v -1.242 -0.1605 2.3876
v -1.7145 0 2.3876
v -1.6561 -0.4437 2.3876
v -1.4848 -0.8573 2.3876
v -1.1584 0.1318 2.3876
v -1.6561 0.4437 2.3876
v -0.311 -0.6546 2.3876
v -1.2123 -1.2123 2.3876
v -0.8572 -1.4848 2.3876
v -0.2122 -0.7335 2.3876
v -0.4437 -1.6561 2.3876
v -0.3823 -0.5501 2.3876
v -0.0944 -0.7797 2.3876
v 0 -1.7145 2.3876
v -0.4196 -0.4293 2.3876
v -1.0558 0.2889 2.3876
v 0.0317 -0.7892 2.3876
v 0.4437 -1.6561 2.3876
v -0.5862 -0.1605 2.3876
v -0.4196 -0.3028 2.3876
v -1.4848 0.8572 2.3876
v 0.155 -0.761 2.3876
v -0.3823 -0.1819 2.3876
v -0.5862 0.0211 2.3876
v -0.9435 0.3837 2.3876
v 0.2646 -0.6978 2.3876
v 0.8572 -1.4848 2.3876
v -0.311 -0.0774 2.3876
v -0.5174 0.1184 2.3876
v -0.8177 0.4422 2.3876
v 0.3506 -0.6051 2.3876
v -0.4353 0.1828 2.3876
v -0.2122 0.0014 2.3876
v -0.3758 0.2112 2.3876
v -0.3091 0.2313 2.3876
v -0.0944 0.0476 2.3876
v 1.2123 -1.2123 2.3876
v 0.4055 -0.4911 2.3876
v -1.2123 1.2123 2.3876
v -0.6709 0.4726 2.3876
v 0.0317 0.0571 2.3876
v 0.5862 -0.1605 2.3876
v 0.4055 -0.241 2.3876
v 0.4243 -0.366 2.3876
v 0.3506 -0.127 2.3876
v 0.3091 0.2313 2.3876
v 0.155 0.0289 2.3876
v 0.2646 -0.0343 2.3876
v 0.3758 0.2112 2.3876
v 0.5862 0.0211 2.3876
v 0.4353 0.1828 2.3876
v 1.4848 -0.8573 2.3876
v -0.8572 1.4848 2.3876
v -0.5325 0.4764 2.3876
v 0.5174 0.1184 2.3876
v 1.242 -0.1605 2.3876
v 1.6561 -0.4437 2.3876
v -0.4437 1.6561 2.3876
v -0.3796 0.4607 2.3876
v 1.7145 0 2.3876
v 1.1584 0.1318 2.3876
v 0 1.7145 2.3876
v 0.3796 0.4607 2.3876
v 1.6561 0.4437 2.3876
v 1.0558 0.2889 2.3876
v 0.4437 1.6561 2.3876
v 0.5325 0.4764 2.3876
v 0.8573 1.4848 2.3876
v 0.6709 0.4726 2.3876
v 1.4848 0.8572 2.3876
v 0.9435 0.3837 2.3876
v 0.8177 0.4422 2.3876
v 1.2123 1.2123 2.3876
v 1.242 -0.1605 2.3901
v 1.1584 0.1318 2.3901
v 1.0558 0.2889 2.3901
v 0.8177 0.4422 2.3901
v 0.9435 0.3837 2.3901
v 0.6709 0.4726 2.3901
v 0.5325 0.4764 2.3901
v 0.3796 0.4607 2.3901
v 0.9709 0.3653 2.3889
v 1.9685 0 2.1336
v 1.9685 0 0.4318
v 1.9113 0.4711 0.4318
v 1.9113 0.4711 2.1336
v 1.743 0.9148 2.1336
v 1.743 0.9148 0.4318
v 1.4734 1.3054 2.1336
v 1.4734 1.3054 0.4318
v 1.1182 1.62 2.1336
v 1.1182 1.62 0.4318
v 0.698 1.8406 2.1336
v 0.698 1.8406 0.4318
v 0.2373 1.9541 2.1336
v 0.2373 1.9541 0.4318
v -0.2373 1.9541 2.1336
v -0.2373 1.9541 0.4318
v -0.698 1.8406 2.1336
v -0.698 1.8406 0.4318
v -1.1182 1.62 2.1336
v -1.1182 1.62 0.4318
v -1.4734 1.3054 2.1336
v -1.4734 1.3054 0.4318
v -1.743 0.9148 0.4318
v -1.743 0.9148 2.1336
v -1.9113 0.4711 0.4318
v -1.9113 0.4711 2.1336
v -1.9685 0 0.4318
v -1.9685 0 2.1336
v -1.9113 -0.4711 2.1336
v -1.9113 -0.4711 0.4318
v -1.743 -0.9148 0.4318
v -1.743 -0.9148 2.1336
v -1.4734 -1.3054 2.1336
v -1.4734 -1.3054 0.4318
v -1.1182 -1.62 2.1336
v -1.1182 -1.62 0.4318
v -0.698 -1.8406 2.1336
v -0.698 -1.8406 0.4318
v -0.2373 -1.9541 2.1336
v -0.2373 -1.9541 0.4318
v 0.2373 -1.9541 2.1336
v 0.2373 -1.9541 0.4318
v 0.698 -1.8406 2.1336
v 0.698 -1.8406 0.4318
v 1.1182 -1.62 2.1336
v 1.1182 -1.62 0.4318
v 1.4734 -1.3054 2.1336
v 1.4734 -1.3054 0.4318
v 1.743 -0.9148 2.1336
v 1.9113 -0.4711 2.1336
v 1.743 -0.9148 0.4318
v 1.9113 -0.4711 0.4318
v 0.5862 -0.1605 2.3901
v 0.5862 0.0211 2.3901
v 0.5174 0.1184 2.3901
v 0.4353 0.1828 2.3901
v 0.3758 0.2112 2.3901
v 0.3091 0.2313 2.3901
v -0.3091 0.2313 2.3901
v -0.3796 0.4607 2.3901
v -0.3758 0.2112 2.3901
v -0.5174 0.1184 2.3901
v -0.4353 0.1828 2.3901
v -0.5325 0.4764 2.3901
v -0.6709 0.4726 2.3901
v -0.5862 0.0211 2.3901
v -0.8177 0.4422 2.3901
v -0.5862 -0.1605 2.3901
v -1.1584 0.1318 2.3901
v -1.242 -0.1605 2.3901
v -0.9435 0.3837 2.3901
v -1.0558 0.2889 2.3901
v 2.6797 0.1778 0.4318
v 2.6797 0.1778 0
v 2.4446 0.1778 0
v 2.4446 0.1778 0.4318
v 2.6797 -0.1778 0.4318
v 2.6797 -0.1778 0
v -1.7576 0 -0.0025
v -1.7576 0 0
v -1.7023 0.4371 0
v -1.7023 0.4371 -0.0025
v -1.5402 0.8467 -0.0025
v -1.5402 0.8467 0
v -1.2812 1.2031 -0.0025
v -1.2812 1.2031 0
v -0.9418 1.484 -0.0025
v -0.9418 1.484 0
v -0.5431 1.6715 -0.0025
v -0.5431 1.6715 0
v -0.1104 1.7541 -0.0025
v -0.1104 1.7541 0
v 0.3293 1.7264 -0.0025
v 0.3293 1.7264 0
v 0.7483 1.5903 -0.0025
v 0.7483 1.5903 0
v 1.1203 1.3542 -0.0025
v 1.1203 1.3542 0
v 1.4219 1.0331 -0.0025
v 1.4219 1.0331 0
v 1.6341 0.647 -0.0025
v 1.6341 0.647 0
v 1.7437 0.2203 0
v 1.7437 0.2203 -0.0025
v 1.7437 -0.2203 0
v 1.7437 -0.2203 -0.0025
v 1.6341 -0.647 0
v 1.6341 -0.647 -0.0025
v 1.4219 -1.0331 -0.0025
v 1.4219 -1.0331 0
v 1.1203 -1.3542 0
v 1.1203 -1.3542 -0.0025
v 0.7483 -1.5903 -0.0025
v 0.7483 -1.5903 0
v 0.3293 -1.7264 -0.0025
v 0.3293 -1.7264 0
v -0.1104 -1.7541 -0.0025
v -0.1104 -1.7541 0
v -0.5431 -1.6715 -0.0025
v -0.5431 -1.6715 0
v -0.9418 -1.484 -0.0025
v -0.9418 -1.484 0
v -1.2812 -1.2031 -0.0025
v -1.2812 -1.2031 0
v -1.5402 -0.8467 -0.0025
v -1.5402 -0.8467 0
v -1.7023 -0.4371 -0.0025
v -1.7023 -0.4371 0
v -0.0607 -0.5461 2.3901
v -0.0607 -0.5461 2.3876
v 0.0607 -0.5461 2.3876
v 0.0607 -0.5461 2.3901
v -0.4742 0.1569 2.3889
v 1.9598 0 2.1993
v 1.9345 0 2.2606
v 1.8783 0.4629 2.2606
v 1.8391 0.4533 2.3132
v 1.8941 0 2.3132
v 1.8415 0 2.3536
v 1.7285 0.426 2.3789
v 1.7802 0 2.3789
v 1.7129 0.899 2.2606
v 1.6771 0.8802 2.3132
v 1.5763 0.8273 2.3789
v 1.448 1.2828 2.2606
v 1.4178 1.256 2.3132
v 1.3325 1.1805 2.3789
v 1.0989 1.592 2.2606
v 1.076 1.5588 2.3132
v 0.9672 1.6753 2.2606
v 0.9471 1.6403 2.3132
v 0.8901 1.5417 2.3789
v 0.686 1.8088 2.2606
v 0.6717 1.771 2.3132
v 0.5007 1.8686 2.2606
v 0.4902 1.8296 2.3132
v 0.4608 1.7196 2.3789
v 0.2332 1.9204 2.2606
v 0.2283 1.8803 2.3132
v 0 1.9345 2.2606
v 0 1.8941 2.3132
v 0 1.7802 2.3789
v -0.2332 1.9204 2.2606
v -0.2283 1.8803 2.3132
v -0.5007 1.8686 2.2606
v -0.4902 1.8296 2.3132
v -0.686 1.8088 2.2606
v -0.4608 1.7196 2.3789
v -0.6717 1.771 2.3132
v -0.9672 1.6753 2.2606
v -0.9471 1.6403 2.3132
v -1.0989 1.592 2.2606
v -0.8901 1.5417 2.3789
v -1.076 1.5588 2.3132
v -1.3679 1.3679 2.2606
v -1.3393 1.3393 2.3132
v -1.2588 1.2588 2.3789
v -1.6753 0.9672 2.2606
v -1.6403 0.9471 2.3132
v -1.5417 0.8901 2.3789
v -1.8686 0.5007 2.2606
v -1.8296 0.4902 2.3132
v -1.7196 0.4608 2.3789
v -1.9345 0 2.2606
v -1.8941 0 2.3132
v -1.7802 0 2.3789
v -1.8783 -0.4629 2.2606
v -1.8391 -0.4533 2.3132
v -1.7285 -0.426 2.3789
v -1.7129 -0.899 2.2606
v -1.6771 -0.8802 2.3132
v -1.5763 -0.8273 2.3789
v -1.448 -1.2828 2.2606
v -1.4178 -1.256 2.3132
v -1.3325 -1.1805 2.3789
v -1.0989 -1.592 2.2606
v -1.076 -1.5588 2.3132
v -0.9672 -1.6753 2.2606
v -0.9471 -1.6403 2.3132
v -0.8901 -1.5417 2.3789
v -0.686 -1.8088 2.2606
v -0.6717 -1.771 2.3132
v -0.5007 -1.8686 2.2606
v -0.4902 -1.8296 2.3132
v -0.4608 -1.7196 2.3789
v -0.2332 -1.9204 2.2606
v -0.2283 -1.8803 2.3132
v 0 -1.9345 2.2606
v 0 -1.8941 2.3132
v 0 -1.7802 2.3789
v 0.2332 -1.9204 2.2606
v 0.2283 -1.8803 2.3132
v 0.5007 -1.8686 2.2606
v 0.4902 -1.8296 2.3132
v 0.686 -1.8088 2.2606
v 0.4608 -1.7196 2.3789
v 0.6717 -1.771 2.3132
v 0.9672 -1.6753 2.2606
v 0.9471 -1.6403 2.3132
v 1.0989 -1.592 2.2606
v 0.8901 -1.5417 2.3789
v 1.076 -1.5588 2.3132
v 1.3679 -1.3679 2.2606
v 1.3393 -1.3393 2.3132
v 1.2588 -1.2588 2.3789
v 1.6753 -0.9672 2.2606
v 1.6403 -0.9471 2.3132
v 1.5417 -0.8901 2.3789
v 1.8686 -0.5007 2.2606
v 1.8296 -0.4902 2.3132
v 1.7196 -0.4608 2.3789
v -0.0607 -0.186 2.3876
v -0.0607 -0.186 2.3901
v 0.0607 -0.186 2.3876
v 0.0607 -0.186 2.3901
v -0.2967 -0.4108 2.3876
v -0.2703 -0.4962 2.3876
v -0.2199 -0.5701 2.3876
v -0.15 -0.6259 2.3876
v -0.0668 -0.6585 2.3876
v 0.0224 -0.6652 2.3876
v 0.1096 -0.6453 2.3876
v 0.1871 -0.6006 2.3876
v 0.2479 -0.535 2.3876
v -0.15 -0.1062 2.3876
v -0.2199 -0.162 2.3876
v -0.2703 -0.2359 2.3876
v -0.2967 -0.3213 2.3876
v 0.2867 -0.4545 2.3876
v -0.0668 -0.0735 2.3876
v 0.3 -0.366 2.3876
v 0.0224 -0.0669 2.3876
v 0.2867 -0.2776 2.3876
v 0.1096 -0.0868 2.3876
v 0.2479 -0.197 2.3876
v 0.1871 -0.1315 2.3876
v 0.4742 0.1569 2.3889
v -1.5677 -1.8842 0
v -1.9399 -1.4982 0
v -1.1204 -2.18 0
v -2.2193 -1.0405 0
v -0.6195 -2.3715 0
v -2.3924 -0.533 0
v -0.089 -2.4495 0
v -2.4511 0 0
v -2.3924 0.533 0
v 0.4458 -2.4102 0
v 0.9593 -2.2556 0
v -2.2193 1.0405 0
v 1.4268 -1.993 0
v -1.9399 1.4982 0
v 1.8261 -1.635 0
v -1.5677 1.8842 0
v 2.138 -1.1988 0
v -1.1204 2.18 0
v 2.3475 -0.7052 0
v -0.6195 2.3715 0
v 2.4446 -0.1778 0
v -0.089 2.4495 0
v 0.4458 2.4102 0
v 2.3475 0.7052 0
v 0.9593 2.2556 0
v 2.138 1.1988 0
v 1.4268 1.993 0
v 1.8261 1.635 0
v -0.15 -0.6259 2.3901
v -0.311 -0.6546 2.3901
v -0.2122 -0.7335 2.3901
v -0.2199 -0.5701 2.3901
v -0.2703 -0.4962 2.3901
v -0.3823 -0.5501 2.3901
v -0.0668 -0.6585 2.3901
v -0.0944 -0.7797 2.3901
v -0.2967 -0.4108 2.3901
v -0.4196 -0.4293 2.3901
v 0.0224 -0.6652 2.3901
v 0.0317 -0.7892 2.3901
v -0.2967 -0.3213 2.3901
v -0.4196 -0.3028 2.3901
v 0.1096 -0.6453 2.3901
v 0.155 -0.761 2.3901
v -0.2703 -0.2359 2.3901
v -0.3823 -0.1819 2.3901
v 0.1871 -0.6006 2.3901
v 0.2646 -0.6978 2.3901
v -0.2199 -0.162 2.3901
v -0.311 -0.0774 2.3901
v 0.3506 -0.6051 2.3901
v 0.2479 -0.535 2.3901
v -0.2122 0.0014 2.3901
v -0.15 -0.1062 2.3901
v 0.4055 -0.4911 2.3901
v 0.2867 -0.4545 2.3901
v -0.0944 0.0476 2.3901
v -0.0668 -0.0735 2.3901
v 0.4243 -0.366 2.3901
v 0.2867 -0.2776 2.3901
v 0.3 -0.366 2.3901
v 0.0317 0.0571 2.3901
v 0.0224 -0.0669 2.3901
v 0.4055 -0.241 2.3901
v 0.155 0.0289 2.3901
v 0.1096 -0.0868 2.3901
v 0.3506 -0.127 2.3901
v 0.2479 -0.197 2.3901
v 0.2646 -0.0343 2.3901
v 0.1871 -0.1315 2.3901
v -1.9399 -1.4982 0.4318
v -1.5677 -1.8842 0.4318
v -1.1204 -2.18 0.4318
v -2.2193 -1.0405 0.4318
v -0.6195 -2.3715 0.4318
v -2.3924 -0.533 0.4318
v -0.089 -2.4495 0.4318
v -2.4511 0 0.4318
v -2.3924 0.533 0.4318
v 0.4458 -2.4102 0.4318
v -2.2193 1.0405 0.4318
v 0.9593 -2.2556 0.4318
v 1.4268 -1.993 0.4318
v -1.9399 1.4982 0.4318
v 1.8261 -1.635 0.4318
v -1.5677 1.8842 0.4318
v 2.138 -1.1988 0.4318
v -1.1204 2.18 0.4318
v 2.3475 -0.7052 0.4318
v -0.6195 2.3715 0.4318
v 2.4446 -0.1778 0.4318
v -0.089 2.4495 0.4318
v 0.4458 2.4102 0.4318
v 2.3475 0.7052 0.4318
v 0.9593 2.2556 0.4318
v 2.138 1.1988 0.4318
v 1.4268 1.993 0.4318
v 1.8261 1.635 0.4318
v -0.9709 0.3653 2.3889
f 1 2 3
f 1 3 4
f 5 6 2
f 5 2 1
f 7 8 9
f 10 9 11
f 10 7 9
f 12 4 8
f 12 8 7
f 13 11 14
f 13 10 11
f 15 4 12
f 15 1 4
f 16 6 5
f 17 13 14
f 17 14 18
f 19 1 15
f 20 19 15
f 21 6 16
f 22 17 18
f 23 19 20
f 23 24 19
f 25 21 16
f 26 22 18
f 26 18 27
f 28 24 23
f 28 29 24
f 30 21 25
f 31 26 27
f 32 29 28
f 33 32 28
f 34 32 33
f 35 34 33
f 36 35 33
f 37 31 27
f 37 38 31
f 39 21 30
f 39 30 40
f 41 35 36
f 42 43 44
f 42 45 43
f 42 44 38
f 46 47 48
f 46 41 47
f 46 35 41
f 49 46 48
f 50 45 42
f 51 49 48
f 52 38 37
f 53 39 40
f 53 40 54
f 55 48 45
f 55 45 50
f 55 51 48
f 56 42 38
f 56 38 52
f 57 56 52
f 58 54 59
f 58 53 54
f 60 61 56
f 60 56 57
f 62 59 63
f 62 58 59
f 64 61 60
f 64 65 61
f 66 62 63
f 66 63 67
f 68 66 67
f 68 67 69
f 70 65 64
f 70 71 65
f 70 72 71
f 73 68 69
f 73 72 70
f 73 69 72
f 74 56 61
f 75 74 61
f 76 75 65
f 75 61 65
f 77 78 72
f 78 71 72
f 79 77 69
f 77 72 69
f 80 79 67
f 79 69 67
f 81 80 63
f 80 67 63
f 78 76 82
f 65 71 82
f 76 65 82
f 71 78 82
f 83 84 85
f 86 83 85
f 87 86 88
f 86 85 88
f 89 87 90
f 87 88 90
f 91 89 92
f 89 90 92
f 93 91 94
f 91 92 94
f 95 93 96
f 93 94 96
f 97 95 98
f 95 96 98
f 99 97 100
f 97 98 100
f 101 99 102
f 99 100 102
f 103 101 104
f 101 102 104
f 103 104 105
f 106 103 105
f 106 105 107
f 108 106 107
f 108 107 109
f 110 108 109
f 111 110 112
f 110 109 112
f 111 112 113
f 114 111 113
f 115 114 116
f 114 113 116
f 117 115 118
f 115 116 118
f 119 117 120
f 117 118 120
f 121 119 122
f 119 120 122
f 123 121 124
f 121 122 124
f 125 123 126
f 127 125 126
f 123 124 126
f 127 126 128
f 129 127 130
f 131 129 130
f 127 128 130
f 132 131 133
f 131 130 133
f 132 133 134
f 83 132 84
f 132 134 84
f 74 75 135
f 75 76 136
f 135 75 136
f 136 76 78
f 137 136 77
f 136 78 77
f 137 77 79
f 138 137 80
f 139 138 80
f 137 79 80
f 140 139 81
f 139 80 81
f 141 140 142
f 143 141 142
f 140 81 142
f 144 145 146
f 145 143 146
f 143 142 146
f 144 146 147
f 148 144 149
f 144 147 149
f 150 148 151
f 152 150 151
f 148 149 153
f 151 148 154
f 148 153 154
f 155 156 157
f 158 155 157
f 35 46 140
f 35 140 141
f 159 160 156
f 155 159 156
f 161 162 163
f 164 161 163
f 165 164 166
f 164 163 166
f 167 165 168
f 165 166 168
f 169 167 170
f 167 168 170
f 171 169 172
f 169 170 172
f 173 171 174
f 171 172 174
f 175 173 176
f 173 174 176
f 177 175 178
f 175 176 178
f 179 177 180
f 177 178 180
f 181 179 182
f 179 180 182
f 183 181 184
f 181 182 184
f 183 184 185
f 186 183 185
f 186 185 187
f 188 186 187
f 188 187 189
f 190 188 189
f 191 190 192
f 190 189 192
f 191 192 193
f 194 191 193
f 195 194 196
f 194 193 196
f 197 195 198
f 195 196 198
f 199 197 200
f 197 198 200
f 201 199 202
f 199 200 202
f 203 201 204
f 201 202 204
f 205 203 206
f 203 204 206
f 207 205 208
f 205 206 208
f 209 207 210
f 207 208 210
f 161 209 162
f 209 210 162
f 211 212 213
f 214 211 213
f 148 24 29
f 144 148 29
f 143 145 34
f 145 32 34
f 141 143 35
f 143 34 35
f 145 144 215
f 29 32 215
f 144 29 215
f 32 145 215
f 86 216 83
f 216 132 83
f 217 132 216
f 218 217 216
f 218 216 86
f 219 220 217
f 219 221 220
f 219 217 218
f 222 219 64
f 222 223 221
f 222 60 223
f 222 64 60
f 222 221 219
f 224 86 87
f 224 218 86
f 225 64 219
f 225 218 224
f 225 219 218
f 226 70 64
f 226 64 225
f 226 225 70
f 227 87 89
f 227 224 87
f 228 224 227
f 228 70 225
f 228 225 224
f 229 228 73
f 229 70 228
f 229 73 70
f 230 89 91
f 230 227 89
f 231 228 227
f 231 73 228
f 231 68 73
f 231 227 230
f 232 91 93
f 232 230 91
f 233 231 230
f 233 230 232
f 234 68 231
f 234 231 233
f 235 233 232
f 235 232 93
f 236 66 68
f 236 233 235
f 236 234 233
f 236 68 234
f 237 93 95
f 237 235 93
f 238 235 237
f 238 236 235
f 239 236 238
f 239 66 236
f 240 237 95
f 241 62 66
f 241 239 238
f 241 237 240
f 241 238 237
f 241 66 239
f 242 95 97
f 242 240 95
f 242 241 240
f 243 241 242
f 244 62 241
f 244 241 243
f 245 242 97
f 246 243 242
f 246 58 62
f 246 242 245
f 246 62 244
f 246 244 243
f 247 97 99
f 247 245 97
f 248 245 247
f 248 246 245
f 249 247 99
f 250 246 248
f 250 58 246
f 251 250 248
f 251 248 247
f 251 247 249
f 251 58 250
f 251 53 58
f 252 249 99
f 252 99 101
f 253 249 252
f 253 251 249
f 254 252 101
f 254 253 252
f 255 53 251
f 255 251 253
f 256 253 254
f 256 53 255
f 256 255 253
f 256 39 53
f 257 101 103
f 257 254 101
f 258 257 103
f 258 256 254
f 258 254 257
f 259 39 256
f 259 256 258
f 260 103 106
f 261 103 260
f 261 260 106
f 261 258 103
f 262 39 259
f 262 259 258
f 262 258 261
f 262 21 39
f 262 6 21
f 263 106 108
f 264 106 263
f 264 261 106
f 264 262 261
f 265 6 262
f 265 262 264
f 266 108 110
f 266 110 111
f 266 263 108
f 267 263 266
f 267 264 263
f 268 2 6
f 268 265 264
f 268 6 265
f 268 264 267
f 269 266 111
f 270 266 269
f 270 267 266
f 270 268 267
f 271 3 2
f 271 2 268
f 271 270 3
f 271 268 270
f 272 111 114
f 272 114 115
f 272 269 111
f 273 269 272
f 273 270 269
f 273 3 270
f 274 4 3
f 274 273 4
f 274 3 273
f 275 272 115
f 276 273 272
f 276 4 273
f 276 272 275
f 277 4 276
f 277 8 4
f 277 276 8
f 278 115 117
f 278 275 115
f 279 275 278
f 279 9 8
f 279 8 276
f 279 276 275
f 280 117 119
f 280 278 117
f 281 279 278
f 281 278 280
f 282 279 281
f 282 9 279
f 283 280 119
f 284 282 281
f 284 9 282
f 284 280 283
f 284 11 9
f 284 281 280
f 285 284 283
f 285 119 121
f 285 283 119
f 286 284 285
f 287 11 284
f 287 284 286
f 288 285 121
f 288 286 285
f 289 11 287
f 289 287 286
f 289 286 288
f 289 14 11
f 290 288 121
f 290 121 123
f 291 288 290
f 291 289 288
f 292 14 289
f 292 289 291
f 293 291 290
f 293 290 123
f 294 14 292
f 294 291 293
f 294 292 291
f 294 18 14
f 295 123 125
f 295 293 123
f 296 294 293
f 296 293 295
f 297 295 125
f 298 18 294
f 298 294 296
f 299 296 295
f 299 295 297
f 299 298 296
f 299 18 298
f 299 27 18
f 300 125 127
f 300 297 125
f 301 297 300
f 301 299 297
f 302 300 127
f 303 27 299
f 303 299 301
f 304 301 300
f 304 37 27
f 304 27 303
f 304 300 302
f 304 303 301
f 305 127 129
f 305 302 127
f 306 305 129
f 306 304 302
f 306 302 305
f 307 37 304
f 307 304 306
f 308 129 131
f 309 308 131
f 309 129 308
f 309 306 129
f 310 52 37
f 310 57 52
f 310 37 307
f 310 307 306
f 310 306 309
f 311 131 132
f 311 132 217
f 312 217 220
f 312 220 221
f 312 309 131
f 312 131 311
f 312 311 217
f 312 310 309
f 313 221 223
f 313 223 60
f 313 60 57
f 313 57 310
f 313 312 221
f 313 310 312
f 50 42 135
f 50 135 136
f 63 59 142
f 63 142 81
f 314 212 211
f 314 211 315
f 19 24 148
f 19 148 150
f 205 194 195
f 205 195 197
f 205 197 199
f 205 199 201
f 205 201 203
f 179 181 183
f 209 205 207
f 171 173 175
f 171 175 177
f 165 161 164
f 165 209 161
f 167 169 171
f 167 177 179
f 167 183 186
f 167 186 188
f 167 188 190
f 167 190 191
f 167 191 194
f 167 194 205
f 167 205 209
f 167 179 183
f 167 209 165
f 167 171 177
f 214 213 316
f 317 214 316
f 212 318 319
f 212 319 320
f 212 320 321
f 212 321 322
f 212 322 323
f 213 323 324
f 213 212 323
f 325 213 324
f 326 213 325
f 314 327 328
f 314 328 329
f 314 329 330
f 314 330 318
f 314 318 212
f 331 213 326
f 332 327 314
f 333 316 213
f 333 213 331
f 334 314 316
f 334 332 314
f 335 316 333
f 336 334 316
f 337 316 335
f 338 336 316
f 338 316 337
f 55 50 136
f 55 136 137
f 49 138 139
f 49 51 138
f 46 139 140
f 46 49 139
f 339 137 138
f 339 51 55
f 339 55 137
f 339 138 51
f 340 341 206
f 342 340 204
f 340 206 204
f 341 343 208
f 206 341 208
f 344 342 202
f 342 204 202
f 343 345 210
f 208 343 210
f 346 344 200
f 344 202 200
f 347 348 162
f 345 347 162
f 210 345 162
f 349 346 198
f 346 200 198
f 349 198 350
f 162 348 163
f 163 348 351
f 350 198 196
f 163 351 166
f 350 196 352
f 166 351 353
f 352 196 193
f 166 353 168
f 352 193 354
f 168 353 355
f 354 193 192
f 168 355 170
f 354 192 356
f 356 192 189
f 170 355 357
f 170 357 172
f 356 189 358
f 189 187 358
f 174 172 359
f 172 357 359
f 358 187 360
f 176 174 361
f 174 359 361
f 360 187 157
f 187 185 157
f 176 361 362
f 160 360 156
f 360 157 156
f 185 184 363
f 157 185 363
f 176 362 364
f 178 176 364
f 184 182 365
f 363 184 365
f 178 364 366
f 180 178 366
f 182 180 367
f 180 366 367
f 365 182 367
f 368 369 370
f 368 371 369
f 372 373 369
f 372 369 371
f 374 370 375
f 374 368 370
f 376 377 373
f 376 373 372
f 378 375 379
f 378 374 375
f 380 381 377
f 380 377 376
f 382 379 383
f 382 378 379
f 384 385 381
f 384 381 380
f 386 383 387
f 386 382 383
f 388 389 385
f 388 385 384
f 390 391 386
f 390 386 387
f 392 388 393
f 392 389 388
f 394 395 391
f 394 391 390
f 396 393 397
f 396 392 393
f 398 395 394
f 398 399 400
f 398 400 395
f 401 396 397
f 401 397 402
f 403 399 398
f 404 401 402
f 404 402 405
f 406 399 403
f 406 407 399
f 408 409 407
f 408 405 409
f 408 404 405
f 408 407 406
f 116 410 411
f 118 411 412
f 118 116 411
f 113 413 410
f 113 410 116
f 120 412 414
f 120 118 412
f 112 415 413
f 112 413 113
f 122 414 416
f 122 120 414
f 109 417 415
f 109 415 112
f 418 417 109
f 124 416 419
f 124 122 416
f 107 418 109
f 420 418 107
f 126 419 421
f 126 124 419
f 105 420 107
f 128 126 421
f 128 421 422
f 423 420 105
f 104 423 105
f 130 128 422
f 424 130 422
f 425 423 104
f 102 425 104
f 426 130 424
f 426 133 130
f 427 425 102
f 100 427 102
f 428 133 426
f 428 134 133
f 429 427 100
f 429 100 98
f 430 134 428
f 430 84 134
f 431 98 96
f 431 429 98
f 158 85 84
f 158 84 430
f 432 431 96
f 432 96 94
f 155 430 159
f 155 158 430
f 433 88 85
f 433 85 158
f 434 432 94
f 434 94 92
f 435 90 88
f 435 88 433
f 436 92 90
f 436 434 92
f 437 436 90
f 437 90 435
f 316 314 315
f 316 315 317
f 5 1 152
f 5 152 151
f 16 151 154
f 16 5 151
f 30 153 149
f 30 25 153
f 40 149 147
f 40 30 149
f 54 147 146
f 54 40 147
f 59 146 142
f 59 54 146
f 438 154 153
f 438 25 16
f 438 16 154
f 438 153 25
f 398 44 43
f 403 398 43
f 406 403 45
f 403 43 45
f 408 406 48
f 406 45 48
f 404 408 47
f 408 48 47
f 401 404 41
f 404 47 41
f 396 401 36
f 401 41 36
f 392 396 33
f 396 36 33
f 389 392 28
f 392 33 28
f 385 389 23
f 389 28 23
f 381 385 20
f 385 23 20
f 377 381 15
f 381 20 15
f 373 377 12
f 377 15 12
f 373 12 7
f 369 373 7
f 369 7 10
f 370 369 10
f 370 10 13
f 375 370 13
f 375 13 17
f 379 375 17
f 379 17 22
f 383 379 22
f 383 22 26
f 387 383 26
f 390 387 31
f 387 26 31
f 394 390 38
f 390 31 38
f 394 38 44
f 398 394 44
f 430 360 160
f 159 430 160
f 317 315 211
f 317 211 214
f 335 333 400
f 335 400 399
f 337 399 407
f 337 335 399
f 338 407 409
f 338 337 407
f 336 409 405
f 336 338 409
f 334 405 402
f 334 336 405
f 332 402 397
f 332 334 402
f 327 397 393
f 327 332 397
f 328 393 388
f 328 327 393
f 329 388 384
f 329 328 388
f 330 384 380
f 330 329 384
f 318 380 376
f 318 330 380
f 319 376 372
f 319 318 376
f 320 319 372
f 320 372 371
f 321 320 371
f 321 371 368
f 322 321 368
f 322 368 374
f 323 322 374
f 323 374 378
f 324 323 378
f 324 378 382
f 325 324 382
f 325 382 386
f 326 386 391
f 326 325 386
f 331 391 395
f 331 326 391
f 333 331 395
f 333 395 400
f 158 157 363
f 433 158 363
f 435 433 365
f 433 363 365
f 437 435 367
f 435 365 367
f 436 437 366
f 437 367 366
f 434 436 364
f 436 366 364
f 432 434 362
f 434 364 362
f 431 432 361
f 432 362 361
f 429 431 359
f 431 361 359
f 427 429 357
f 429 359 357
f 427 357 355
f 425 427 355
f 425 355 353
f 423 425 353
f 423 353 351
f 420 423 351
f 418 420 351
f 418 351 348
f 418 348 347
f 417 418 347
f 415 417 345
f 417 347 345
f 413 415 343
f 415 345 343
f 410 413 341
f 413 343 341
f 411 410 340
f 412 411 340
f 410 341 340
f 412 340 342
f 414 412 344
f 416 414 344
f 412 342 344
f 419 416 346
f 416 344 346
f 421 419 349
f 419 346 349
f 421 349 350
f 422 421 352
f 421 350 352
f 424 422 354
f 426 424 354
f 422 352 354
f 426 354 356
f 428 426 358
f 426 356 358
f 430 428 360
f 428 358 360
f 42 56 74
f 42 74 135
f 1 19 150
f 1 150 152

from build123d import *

# Parameters (mm, degrees)
BOSS_EXTRUDE1_DEPTH = 0.4318
SKETCH2_R           = 1.9685
BOSS_EXTRUDE2_DEPTH = 1.9558
SKETCH3_R           = 1.757566481
BOSS_EXTRUDE3_DEPTH = 0.00254
FILLET1_R           = 0.254
SKETCH4_R           = 0.424306482
SKETCH4_R_2         = 0.300017148
SKETCH4_W           = 0.121389708
SKETCH4_H           = 0.360153111
BOSS_EXTRUDE6_DEPTH = 0.00254


with BuildPart() as part:
    # Sketch1 → Boss-Extrude1 (new body)
    with BuildSketch(Plane.XY):
        with BuildLine():
            Line((2.6797, 0.1778), (2.4511, 0.1778))
            Line((2.4511, 0.1778), (2.44464279, 0.1778))
            ThreePointArc((2.44464279, 0.1778), (-2.4511, 0), (2.44464279, -0.1778))
            Line((2.44464279, -0.1778), (2.4511, -0.1778))
            Line((2.4511, -0.1778), (2.6797, -0.1778))
            Line((2.6797, -0.1778), (2.6797, 0.1778))
        make_face()
    extrude(amount=BOSS_EXTRUDE1_DEPTH)

    # Sketch2 → Boss-Extrude2 (add)
    with BuildSketch(Plane.XY.offset(0.4318)):
        Circle(SKETCH2_R)
    extrude(amount=BOSS_EXTRUDE2_DEPTH)

    # Sketch3 → Boss-Extrude3 (add)
    with BuildSketch(Plane(origin=(0, 0, 0), x_dir=(-1, 0, 0), z_dir=(0, 0, -1))):
        Circle(SKETCH3_R)
    extrude(amount=BOSS_EXTRUDE3_DEPTH)

    # Fillet1
    fillet1_edges = [part.edges().sort_by_distance(p)[0] for p in [
        (-1.9685, 0, 2.3876),
    ]]
    fillet(fillet1_edges, radius=FILLET1_R)

    # Sketch4 → Boss-Extrude6 (add)
    with BuildSketch(Plane.XY.offset(2.3876)):
        with Locations((0, -0.366036865)):
            Circle(SKETCH4_R)
        with Locations((0, -0.366036865)):
            Circle(SKETCH4_R_2, mode=Mode.SUBTRACT)
        with Locations((0, -0.366036865)):
            Rectangle(SKETCH4_W, SKETCH4_H)
        with BuildLine():
            add(Edge.make_bspline(
                [(0.586204822, 0.021051911), (0.500696389, 0.187631338), (0.309059488, 0.231300095)],
                knots=[0, 0, 0, 1, 1, 1], degree=2))
            Line((0.309059488, 0.231300095), (-0.309059488, 0.231300095))
            add(Edge.make_bspline(
                [(-0.586204822, 0.021051911), (-0.500696389, 0.187631338), (-0.309059488, 0.231300095)],
                knots=[0, 0, 0, 1, 1, 1], degree=2))
            Line((-0.586204822, 0.021051911), (-0.586204822, -0.160526067))
            Line((-0.586204822, -0.160526067), (-1.241971444, -0.160526067))
            add(Edge.make_bspline(
                [(-1.241971444, -0.160526067), (-1.130990503, 0.580439961), (-0.379571619, 0.460661751)],
                knots=[0, 0, 0, 1, 1, 1], degree=2))
            Line((-0.379571619, 0.460661751), (0.379571619, 0.460661751))
            add(Edge.make_bspline(
                [(1.241971444, -0.160526067), (1.130990503, 0.580439961), (0.379571619, 0.460661751)],
                knots=[0, 0, 0, 1, 1, 1], degree=2))
            Line((1.241971444, -0.160526067), (0.586204822, -0.160526067))
            Line((0.586204822, -0.160526067), (0.586204822, 0.021051911))
        make_face()
    extrude(amount=BOSS_EXTRUDE6_DEPTH)


solid = part.part
